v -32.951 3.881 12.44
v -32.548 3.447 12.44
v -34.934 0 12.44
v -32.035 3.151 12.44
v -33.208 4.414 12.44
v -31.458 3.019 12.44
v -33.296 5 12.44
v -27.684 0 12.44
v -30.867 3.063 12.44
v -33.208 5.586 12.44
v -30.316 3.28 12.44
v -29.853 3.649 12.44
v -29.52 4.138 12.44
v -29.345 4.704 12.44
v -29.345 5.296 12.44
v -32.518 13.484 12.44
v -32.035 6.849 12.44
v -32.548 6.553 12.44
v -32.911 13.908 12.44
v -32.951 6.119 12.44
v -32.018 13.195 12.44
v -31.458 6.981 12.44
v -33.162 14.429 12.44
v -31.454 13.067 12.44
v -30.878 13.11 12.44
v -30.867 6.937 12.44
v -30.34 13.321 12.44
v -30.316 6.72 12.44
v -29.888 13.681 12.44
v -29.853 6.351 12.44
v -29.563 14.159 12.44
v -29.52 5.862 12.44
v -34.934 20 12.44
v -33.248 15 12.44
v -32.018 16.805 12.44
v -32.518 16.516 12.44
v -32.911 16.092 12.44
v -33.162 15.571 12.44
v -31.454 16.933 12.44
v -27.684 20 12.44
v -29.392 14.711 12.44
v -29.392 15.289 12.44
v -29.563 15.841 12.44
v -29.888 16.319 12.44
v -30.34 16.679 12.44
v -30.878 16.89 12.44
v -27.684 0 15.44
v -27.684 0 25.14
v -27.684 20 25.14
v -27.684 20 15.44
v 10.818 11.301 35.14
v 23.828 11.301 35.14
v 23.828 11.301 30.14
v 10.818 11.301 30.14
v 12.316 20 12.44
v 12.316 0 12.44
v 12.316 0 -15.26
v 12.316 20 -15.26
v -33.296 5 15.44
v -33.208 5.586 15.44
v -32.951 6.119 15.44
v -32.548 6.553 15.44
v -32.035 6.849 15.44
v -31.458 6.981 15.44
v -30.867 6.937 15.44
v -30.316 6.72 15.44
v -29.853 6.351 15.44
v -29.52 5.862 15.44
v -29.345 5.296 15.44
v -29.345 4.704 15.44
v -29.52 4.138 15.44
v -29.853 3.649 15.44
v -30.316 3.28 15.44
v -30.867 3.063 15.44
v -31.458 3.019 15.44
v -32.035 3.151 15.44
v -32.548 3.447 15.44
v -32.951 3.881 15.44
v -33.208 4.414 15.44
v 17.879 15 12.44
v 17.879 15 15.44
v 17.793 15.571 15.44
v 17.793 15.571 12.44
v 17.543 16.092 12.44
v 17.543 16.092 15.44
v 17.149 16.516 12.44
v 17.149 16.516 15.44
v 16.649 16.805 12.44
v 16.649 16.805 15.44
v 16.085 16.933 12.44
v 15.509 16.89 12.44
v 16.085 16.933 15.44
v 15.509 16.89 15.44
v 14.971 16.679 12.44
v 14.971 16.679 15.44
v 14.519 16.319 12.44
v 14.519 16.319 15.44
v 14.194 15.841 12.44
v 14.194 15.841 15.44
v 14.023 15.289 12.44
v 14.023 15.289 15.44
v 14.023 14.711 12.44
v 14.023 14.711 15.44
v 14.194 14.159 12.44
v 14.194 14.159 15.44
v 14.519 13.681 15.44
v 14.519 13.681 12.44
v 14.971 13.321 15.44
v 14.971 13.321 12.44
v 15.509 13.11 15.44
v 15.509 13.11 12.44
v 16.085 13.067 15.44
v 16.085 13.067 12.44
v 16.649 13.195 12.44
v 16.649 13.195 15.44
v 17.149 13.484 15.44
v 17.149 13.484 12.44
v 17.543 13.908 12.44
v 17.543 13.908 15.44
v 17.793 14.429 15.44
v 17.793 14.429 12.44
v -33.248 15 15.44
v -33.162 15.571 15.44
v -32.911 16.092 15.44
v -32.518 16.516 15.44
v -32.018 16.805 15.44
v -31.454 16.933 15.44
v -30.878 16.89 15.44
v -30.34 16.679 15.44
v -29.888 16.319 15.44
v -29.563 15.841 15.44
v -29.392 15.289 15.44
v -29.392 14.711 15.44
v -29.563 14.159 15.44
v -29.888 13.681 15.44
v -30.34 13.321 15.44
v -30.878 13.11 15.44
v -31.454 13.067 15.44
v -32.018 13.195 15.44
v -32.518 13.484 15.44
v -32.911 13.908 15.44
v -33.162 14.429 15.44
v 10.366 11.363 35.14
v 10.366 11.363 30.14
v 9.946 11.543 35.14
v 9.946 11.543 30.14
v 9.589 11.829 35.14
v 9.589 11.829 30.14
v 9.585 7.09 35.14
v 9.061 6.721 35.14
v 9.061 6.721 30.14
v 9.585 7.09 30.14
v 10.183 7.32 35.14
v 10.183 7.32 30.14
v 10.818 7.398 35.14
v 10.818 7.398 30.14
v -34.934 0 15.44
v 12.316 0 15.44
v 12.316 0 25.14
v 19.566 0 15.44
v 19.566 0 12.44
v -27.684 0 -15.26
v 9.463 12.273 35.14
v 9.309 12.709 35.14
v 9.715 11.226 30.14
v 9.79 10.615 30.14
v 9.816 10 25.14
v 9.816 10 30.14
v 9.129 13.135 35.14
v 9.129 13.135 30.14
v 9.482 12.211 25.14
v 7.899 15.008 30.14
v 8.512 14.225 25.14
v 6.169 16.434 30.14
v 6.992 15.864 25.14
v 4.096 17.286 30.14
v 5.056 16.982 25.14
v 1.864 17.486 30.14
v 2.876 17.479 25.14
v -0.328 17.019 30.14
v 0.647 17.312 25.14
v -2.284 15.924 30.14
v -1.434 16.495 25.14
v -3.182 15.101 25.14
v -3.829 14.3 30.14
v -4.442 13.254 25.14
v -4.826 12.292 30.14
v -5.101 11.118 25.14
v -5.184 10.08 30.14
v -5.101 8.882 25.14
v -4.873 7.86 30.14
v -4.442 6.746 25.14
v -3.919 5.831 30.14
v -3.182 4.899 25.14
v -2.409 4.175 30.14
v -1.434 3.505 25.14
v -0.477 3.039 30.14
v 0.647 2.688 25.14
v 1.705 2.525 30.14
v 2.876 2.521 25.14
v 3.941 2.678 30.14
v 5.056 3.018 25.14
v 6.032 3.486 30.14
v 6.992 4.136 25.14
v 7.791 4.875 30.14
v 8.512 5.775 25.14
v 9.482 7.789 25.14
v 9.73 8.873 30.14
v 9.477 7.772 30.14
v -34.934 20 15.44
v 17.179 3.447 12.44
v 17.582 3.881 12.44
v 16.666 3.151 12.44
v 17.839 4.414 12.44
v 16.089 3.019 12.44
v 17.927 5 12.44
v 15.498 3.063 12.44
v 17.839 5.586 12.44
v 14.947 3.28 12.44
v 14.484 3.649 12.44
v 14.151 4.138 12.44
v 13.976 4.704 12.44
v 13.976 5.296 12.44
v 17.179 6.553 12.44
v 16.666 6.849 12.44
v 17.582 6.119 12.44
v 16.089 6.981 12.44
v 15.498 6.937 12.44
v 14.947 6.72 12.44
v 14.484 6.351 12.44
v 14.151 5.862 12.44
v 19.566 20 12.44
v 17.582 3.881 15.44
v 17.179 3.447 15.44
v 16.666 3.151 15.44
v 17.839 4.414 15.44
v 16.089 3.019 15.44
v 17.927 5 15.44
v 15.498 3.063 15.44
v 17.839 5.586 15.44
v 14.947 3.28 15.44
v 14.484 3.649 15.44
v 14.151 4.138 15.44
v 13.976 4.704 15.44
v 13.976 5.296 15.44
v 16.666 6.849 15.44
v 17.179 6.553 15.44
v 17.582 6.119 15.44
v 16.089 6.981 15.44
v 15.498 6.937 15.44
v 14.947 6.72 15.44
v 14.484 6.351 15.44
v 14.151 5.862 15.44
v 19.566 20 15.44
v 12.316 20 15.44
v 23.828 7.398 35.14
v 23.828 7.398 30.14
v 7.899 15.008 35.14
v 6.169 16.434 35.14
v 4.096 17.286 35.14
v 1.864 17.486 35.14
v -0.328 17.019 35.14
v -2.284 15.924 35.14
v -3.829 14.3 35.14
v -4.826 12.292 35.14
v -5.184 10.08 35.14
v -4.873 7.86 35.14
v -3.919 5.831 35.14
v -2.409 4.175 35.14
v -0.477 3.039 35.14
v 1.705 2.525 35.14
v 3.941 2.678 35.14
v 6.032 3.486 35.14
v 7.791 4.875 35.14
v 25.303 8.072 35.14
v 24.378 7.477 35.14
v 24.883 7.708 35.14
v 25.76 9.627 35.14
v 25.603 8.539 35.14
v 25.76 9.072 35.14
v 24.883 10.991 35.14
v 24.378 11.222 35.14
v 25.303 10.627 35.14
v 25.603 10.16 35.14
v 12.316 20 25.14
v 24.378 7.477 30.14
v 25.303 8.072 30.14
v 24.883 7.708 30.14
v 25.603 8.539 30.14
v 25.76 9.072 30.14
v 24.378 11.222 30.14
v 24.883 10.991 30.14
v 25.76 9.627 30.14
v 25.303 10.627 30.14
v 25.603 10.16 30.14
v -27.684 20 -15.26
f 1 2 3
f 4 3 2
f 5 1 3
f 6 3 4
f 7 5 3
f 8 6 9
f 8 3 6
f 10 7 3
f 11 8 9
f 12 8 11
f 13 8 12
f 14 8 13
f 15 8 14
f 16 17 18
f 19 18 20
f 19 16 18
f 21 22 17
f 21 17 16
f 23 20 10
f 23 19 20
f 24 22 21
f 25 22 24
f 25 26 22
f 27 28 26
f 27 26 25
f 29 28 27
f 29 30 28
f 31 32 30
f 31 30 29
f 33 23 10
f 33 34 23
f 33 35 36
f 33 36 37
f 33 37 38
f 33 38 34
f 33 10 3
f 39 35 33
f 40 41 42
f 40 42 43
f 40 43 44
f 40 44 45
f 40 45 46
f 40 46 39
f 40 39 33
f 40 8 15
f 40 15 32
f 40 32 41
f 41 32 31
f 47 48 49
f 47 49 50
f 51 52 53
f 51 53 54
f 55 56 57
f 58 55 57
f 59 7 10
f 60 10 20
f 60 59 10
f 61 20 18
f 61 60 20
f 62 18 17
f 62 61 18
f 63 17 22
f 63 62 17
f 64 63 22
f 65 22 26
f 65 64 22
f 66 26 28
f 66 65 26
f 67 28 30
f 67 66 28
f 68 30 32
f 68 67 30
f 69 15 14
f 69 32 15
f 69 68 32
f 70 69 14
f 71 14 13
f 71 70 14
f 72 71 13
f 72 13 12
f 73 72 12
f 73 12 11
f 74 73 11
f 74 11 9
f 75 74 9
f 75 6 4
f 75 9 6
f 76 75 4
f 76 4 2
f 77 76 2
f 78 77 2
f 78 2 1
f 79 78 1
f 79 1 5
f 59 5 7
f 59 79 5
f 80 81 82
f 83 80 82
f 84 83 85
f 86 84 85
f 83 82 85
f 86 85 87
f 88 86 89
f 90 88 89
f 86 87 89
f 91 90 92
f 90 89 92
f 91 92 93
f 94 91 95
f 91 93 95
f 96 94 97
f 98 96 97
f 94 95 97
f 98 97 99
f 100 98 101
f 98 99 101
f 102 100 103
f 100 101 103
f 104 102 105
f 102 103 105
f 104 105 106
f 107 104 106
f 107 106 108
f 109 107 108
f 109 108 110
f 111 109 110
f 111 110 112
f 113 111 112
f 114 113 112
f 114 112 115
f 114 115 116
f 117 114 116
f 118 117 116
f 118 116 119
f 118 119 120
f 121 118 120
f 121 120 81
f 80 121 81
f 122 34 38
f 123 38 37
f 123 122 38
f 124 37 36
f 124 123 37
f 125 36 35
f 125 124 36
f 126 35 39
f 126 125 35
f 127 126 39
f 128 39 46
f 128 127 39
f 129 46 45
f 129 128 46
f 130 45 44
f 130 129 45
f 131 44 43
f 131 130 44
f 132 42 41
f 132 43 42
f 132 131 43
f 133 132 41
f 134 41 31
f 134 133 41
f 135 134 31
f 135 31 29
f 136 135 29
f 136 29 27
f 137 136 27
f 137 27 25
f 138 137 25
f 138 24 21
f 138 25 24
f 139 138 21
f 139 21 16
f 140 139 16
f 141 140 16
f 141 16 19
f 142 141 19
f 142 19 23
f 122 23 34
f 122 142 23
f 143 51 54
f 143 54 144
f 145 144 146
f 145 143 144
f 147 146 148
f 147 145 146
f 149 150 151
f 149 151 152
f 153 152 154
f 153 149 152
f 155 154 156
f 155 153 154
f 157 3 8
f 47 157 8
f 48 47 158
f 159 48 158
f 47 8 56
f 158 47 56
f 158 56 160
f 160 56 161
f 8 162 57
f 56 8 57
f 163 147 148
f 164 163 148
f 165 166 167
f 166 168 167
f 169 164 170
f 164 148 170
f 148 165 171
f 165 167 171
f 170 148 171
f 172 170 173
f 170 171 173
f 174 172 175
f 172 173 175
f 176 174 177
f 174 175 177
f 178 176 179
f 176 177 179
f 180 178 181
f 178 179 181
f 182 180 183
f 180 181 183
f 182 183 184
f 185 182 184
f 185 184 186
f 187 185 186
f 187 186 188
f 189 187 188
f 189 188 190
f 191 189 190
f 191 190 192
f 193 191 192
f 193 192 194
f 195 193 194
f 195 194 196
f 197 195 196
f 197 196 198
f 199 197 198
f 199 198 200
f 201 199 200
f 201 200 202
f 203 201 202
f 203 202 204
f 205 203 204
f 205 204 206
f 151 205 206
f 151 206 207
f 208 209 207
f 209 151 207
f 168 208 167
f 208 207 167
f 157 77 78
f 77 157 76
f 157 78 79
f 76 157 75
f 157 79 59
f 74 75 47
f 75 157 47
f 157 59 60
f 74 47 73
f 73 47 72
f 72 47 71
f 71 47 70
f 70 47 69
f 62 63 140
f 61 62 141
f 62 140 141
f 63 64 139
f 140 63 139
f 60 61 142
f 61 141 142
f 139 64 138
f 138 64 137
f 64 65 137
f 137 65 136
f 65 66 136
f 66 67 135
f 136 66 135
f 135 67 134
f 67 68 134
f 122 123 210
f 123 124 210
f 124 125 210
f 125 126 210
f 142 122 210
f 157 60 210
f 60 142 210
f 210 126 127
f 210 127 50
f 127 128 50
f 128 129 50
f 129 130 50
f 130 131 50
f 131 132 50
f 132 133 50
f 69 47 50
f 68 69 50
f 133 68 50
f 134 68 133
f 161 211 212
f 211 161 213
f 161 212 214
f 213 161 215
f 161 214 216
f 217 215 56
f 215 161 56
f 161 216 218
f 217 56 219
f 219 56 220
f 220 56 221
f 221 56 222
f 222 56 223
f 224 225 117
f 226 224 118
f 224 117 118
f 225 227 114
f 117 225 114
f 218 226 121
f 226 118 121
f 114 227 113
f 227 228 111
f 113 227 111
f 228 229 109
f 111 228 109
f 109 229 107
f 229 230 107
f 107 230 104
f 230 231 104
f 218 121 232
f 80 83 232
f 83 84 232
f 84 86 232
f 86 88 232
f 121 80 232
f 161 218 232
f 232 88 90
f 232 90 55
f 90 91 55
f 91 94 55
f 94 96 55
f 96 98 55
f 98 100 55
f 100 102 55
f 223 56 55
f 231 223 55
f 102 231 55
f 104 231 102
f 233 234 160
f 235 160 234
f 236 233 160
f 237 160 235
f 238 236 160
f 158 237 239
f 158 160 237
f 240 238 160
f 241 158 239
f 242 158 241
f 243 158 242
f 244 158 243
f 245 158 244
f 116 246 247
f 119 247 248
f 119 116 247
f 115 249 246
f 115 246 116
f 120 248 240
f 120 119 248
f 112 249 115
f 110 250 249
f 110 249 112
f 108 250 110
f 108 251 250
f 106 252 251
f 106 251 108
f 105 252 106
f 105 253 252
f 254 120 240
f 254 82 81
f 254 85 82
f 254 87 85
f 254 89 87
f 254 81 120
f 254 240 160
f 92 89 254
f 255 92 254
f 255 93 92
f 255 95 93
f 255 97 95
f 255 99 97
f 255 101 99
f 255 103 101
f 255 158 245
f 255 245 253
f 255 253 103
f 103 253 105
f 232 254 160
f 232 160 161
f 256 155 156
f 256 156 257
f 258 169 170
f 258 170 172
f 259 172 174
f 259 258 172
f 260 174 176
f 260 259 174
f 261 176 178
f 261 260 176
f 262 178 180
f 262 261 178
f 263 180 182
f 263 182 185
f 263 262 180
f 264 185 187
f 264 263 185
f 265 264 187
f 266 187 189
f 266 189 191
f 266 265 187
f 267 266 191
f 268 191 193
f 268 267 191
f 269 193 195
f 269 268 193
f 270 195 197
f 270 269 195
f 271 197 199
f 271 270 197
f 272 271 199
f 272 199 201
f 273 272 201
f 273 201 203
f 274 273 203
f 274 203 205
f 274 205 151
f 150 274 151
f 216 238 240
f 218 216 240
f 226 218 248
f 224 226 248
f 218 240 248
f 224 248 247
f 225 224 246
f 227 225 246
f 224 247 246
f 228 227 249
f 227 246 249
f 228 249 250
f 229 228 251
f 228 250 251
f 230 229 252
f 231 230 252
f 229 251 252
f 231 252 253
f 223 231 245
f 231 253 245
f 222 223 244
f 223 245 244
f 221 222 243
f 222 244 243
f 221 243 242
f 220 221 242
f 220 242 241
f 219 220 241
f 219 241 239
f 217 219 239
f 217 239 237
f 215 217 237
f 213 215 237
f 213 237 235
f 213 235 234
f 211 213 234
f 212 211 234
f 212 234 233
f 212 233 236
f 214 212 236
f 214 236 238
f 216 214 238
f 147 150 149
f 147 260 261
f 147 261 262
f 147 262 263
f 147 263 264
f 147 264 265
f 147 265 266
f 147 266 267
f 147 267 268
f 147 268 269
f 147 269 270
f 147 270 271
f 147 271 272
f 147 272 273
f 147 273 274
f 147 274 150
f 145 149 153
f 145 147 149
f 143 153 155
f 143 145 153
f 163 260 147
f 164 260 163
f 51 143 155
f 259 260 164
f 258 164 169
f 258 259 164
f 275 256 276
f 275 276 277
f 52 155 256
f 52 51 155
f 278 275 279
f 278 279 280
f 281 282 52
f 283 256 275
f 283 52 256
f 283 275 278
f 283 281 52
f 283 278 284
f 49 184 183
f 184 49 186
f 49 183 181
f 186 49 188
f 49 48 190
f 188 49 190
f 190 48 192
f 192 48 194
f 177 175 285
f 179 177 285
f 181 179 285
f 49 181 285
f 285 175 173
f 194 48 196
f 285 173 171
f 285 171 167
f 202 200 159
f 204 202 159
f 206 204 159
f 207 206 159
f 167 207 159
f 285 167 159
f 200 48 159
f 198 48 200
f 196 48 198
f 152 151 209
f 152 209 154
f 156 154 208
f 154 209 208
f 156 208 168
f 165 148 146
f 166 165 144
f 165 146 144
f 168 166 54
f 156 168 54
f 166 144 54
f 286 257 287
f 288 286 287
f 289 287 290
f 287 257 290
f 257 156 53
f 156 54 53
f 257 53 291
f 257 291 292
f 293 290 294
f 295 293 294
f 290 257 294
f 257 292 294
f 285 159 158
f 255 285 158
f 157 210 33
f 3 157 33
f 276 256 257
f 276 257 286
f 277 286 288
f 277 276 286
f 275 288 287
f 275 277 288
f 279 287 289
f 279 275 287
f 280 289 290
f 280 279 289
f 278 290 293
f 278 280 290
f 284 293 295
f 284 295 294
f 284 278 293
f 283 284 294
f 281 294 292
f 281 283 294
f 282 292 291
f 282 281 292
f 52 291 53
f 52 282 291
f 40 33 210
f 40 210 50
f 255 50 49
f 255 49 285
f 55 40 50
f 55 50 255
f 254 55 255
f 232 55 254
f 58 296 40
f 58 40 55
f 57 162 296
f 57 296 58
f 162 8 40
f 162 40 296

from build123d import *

# Parameters (mm, degrees)
SKETCH1_W           = 40
SKETCH1_H           = 40.4
BOSS_EXTRUDE1_DEPTH = 20
SKETCH3_W           = 3
SKETCH3_H           = 20
BOSS_EXTRUDE2_DEPTH = 7.25
SKETCH5_R           = 1.938887877
SKETCH5_R_2         = 1.98650292
CUT_EXTRUDE1_DEPTH  = 7.25
SKETCH6_R           = 7.5
BOSS_EXTRUDE3_DEPTH = 10
BOSS_EXTRUDE4_DEPTH = 5


with BuildPart() as part:
    # Sketch1 → Boss-Extrude1 (new body)
    with BuildSketch(Plane(origin=(0, 0, 0), x_dir=(1, 0, 0), z_dir=(0, 1, 0))):
        with Locations((-7.684478372, -4.939949109)):
            Rectangle(SKETCH1_W, SKETCH1_H)
    extrude(amount=BOSS_EXTRUDE1_DEPTH)

    # Sketch3 → Boss-Extrude2 (add)
    with BuildSketch(Plane(origin=(12.315521628, 0, 0), x_dir=(0, 0, -1), z_dir=(1, 0, 0))):
        with Locations((-13.939949109, 10)):
            Rectangle(SKETCH3_W, SKETCH3_H)
    boss_extrude2 = extrude(amount=BOSS_EXTRUDE2_DEPTH)

    # Mirror1: Boss-Extrude2 across plane
    add(boss_extrude2.mirror(Plane.ZY.offset(7.684478372)))

    # Sketch5 → Cut-Extrude1 (cut)
    with BuildSketch(Plane.XY.offset(15.439949109)):
        with Locations((15.940521628, 15)):
            Circle(SKETCH5_R)
        with Locations((15.940521628, 5)):
            Circle(SKETCH5_R_2)
    cut_extrude1 = extrude(amount=-CUT_EXTRUDE1_DEPTH, mode=Mode.SUBTRACT)

    # Mirror2: Cut-Extrude1 across plane
    add(cut_extrude1.mirror(Plane.ZY.offset(7.684478372)), mode=Mode.SUBTRACT)

    # Sketch6 → Boss-Extrude3 (add)
    with BuildSketch(Plane.XY.offset(25.139949109)):
        with Locations((2.315521628, 10)):
            Circle(SKETCH6_R)
    extrude(amount=BOSS_EXTRUDE3_DEPTH)

    # Sketch8 → Boss-Extrude4 (add)
    with BuildSketch(Plane.XY.offset(35.139949109)):
        with BuildLine():
            Line((10.818468117, 7.39802315), (23.828352366, 7.39802315))
            ThreePointArc((23.828352366, 7.39802315), (25.779835003, 9.349505788), (23.828352366, 11.300988425))
            Line((23.828352366, 11.300988425), (10.818468117, 11.300988425))
            ThreePointArc((10.818468117, 11.300988425), (9.571889646, 11.847462314), (9.129094063, 13.1345224))
            ThreePointArc((9.129094063, 13.1345224), (-5.184055447, 10.07964725), (9.060986037, 6.72147748))
            ThreePointArc((9.060986037, 6.72147748), (9.876866117, 7.223046033), (10.818468117, 7.39802315))
        make_face()
    extrude(amount=-BOSS_EXTRUDE4_DEPTH)


solid = part.part
